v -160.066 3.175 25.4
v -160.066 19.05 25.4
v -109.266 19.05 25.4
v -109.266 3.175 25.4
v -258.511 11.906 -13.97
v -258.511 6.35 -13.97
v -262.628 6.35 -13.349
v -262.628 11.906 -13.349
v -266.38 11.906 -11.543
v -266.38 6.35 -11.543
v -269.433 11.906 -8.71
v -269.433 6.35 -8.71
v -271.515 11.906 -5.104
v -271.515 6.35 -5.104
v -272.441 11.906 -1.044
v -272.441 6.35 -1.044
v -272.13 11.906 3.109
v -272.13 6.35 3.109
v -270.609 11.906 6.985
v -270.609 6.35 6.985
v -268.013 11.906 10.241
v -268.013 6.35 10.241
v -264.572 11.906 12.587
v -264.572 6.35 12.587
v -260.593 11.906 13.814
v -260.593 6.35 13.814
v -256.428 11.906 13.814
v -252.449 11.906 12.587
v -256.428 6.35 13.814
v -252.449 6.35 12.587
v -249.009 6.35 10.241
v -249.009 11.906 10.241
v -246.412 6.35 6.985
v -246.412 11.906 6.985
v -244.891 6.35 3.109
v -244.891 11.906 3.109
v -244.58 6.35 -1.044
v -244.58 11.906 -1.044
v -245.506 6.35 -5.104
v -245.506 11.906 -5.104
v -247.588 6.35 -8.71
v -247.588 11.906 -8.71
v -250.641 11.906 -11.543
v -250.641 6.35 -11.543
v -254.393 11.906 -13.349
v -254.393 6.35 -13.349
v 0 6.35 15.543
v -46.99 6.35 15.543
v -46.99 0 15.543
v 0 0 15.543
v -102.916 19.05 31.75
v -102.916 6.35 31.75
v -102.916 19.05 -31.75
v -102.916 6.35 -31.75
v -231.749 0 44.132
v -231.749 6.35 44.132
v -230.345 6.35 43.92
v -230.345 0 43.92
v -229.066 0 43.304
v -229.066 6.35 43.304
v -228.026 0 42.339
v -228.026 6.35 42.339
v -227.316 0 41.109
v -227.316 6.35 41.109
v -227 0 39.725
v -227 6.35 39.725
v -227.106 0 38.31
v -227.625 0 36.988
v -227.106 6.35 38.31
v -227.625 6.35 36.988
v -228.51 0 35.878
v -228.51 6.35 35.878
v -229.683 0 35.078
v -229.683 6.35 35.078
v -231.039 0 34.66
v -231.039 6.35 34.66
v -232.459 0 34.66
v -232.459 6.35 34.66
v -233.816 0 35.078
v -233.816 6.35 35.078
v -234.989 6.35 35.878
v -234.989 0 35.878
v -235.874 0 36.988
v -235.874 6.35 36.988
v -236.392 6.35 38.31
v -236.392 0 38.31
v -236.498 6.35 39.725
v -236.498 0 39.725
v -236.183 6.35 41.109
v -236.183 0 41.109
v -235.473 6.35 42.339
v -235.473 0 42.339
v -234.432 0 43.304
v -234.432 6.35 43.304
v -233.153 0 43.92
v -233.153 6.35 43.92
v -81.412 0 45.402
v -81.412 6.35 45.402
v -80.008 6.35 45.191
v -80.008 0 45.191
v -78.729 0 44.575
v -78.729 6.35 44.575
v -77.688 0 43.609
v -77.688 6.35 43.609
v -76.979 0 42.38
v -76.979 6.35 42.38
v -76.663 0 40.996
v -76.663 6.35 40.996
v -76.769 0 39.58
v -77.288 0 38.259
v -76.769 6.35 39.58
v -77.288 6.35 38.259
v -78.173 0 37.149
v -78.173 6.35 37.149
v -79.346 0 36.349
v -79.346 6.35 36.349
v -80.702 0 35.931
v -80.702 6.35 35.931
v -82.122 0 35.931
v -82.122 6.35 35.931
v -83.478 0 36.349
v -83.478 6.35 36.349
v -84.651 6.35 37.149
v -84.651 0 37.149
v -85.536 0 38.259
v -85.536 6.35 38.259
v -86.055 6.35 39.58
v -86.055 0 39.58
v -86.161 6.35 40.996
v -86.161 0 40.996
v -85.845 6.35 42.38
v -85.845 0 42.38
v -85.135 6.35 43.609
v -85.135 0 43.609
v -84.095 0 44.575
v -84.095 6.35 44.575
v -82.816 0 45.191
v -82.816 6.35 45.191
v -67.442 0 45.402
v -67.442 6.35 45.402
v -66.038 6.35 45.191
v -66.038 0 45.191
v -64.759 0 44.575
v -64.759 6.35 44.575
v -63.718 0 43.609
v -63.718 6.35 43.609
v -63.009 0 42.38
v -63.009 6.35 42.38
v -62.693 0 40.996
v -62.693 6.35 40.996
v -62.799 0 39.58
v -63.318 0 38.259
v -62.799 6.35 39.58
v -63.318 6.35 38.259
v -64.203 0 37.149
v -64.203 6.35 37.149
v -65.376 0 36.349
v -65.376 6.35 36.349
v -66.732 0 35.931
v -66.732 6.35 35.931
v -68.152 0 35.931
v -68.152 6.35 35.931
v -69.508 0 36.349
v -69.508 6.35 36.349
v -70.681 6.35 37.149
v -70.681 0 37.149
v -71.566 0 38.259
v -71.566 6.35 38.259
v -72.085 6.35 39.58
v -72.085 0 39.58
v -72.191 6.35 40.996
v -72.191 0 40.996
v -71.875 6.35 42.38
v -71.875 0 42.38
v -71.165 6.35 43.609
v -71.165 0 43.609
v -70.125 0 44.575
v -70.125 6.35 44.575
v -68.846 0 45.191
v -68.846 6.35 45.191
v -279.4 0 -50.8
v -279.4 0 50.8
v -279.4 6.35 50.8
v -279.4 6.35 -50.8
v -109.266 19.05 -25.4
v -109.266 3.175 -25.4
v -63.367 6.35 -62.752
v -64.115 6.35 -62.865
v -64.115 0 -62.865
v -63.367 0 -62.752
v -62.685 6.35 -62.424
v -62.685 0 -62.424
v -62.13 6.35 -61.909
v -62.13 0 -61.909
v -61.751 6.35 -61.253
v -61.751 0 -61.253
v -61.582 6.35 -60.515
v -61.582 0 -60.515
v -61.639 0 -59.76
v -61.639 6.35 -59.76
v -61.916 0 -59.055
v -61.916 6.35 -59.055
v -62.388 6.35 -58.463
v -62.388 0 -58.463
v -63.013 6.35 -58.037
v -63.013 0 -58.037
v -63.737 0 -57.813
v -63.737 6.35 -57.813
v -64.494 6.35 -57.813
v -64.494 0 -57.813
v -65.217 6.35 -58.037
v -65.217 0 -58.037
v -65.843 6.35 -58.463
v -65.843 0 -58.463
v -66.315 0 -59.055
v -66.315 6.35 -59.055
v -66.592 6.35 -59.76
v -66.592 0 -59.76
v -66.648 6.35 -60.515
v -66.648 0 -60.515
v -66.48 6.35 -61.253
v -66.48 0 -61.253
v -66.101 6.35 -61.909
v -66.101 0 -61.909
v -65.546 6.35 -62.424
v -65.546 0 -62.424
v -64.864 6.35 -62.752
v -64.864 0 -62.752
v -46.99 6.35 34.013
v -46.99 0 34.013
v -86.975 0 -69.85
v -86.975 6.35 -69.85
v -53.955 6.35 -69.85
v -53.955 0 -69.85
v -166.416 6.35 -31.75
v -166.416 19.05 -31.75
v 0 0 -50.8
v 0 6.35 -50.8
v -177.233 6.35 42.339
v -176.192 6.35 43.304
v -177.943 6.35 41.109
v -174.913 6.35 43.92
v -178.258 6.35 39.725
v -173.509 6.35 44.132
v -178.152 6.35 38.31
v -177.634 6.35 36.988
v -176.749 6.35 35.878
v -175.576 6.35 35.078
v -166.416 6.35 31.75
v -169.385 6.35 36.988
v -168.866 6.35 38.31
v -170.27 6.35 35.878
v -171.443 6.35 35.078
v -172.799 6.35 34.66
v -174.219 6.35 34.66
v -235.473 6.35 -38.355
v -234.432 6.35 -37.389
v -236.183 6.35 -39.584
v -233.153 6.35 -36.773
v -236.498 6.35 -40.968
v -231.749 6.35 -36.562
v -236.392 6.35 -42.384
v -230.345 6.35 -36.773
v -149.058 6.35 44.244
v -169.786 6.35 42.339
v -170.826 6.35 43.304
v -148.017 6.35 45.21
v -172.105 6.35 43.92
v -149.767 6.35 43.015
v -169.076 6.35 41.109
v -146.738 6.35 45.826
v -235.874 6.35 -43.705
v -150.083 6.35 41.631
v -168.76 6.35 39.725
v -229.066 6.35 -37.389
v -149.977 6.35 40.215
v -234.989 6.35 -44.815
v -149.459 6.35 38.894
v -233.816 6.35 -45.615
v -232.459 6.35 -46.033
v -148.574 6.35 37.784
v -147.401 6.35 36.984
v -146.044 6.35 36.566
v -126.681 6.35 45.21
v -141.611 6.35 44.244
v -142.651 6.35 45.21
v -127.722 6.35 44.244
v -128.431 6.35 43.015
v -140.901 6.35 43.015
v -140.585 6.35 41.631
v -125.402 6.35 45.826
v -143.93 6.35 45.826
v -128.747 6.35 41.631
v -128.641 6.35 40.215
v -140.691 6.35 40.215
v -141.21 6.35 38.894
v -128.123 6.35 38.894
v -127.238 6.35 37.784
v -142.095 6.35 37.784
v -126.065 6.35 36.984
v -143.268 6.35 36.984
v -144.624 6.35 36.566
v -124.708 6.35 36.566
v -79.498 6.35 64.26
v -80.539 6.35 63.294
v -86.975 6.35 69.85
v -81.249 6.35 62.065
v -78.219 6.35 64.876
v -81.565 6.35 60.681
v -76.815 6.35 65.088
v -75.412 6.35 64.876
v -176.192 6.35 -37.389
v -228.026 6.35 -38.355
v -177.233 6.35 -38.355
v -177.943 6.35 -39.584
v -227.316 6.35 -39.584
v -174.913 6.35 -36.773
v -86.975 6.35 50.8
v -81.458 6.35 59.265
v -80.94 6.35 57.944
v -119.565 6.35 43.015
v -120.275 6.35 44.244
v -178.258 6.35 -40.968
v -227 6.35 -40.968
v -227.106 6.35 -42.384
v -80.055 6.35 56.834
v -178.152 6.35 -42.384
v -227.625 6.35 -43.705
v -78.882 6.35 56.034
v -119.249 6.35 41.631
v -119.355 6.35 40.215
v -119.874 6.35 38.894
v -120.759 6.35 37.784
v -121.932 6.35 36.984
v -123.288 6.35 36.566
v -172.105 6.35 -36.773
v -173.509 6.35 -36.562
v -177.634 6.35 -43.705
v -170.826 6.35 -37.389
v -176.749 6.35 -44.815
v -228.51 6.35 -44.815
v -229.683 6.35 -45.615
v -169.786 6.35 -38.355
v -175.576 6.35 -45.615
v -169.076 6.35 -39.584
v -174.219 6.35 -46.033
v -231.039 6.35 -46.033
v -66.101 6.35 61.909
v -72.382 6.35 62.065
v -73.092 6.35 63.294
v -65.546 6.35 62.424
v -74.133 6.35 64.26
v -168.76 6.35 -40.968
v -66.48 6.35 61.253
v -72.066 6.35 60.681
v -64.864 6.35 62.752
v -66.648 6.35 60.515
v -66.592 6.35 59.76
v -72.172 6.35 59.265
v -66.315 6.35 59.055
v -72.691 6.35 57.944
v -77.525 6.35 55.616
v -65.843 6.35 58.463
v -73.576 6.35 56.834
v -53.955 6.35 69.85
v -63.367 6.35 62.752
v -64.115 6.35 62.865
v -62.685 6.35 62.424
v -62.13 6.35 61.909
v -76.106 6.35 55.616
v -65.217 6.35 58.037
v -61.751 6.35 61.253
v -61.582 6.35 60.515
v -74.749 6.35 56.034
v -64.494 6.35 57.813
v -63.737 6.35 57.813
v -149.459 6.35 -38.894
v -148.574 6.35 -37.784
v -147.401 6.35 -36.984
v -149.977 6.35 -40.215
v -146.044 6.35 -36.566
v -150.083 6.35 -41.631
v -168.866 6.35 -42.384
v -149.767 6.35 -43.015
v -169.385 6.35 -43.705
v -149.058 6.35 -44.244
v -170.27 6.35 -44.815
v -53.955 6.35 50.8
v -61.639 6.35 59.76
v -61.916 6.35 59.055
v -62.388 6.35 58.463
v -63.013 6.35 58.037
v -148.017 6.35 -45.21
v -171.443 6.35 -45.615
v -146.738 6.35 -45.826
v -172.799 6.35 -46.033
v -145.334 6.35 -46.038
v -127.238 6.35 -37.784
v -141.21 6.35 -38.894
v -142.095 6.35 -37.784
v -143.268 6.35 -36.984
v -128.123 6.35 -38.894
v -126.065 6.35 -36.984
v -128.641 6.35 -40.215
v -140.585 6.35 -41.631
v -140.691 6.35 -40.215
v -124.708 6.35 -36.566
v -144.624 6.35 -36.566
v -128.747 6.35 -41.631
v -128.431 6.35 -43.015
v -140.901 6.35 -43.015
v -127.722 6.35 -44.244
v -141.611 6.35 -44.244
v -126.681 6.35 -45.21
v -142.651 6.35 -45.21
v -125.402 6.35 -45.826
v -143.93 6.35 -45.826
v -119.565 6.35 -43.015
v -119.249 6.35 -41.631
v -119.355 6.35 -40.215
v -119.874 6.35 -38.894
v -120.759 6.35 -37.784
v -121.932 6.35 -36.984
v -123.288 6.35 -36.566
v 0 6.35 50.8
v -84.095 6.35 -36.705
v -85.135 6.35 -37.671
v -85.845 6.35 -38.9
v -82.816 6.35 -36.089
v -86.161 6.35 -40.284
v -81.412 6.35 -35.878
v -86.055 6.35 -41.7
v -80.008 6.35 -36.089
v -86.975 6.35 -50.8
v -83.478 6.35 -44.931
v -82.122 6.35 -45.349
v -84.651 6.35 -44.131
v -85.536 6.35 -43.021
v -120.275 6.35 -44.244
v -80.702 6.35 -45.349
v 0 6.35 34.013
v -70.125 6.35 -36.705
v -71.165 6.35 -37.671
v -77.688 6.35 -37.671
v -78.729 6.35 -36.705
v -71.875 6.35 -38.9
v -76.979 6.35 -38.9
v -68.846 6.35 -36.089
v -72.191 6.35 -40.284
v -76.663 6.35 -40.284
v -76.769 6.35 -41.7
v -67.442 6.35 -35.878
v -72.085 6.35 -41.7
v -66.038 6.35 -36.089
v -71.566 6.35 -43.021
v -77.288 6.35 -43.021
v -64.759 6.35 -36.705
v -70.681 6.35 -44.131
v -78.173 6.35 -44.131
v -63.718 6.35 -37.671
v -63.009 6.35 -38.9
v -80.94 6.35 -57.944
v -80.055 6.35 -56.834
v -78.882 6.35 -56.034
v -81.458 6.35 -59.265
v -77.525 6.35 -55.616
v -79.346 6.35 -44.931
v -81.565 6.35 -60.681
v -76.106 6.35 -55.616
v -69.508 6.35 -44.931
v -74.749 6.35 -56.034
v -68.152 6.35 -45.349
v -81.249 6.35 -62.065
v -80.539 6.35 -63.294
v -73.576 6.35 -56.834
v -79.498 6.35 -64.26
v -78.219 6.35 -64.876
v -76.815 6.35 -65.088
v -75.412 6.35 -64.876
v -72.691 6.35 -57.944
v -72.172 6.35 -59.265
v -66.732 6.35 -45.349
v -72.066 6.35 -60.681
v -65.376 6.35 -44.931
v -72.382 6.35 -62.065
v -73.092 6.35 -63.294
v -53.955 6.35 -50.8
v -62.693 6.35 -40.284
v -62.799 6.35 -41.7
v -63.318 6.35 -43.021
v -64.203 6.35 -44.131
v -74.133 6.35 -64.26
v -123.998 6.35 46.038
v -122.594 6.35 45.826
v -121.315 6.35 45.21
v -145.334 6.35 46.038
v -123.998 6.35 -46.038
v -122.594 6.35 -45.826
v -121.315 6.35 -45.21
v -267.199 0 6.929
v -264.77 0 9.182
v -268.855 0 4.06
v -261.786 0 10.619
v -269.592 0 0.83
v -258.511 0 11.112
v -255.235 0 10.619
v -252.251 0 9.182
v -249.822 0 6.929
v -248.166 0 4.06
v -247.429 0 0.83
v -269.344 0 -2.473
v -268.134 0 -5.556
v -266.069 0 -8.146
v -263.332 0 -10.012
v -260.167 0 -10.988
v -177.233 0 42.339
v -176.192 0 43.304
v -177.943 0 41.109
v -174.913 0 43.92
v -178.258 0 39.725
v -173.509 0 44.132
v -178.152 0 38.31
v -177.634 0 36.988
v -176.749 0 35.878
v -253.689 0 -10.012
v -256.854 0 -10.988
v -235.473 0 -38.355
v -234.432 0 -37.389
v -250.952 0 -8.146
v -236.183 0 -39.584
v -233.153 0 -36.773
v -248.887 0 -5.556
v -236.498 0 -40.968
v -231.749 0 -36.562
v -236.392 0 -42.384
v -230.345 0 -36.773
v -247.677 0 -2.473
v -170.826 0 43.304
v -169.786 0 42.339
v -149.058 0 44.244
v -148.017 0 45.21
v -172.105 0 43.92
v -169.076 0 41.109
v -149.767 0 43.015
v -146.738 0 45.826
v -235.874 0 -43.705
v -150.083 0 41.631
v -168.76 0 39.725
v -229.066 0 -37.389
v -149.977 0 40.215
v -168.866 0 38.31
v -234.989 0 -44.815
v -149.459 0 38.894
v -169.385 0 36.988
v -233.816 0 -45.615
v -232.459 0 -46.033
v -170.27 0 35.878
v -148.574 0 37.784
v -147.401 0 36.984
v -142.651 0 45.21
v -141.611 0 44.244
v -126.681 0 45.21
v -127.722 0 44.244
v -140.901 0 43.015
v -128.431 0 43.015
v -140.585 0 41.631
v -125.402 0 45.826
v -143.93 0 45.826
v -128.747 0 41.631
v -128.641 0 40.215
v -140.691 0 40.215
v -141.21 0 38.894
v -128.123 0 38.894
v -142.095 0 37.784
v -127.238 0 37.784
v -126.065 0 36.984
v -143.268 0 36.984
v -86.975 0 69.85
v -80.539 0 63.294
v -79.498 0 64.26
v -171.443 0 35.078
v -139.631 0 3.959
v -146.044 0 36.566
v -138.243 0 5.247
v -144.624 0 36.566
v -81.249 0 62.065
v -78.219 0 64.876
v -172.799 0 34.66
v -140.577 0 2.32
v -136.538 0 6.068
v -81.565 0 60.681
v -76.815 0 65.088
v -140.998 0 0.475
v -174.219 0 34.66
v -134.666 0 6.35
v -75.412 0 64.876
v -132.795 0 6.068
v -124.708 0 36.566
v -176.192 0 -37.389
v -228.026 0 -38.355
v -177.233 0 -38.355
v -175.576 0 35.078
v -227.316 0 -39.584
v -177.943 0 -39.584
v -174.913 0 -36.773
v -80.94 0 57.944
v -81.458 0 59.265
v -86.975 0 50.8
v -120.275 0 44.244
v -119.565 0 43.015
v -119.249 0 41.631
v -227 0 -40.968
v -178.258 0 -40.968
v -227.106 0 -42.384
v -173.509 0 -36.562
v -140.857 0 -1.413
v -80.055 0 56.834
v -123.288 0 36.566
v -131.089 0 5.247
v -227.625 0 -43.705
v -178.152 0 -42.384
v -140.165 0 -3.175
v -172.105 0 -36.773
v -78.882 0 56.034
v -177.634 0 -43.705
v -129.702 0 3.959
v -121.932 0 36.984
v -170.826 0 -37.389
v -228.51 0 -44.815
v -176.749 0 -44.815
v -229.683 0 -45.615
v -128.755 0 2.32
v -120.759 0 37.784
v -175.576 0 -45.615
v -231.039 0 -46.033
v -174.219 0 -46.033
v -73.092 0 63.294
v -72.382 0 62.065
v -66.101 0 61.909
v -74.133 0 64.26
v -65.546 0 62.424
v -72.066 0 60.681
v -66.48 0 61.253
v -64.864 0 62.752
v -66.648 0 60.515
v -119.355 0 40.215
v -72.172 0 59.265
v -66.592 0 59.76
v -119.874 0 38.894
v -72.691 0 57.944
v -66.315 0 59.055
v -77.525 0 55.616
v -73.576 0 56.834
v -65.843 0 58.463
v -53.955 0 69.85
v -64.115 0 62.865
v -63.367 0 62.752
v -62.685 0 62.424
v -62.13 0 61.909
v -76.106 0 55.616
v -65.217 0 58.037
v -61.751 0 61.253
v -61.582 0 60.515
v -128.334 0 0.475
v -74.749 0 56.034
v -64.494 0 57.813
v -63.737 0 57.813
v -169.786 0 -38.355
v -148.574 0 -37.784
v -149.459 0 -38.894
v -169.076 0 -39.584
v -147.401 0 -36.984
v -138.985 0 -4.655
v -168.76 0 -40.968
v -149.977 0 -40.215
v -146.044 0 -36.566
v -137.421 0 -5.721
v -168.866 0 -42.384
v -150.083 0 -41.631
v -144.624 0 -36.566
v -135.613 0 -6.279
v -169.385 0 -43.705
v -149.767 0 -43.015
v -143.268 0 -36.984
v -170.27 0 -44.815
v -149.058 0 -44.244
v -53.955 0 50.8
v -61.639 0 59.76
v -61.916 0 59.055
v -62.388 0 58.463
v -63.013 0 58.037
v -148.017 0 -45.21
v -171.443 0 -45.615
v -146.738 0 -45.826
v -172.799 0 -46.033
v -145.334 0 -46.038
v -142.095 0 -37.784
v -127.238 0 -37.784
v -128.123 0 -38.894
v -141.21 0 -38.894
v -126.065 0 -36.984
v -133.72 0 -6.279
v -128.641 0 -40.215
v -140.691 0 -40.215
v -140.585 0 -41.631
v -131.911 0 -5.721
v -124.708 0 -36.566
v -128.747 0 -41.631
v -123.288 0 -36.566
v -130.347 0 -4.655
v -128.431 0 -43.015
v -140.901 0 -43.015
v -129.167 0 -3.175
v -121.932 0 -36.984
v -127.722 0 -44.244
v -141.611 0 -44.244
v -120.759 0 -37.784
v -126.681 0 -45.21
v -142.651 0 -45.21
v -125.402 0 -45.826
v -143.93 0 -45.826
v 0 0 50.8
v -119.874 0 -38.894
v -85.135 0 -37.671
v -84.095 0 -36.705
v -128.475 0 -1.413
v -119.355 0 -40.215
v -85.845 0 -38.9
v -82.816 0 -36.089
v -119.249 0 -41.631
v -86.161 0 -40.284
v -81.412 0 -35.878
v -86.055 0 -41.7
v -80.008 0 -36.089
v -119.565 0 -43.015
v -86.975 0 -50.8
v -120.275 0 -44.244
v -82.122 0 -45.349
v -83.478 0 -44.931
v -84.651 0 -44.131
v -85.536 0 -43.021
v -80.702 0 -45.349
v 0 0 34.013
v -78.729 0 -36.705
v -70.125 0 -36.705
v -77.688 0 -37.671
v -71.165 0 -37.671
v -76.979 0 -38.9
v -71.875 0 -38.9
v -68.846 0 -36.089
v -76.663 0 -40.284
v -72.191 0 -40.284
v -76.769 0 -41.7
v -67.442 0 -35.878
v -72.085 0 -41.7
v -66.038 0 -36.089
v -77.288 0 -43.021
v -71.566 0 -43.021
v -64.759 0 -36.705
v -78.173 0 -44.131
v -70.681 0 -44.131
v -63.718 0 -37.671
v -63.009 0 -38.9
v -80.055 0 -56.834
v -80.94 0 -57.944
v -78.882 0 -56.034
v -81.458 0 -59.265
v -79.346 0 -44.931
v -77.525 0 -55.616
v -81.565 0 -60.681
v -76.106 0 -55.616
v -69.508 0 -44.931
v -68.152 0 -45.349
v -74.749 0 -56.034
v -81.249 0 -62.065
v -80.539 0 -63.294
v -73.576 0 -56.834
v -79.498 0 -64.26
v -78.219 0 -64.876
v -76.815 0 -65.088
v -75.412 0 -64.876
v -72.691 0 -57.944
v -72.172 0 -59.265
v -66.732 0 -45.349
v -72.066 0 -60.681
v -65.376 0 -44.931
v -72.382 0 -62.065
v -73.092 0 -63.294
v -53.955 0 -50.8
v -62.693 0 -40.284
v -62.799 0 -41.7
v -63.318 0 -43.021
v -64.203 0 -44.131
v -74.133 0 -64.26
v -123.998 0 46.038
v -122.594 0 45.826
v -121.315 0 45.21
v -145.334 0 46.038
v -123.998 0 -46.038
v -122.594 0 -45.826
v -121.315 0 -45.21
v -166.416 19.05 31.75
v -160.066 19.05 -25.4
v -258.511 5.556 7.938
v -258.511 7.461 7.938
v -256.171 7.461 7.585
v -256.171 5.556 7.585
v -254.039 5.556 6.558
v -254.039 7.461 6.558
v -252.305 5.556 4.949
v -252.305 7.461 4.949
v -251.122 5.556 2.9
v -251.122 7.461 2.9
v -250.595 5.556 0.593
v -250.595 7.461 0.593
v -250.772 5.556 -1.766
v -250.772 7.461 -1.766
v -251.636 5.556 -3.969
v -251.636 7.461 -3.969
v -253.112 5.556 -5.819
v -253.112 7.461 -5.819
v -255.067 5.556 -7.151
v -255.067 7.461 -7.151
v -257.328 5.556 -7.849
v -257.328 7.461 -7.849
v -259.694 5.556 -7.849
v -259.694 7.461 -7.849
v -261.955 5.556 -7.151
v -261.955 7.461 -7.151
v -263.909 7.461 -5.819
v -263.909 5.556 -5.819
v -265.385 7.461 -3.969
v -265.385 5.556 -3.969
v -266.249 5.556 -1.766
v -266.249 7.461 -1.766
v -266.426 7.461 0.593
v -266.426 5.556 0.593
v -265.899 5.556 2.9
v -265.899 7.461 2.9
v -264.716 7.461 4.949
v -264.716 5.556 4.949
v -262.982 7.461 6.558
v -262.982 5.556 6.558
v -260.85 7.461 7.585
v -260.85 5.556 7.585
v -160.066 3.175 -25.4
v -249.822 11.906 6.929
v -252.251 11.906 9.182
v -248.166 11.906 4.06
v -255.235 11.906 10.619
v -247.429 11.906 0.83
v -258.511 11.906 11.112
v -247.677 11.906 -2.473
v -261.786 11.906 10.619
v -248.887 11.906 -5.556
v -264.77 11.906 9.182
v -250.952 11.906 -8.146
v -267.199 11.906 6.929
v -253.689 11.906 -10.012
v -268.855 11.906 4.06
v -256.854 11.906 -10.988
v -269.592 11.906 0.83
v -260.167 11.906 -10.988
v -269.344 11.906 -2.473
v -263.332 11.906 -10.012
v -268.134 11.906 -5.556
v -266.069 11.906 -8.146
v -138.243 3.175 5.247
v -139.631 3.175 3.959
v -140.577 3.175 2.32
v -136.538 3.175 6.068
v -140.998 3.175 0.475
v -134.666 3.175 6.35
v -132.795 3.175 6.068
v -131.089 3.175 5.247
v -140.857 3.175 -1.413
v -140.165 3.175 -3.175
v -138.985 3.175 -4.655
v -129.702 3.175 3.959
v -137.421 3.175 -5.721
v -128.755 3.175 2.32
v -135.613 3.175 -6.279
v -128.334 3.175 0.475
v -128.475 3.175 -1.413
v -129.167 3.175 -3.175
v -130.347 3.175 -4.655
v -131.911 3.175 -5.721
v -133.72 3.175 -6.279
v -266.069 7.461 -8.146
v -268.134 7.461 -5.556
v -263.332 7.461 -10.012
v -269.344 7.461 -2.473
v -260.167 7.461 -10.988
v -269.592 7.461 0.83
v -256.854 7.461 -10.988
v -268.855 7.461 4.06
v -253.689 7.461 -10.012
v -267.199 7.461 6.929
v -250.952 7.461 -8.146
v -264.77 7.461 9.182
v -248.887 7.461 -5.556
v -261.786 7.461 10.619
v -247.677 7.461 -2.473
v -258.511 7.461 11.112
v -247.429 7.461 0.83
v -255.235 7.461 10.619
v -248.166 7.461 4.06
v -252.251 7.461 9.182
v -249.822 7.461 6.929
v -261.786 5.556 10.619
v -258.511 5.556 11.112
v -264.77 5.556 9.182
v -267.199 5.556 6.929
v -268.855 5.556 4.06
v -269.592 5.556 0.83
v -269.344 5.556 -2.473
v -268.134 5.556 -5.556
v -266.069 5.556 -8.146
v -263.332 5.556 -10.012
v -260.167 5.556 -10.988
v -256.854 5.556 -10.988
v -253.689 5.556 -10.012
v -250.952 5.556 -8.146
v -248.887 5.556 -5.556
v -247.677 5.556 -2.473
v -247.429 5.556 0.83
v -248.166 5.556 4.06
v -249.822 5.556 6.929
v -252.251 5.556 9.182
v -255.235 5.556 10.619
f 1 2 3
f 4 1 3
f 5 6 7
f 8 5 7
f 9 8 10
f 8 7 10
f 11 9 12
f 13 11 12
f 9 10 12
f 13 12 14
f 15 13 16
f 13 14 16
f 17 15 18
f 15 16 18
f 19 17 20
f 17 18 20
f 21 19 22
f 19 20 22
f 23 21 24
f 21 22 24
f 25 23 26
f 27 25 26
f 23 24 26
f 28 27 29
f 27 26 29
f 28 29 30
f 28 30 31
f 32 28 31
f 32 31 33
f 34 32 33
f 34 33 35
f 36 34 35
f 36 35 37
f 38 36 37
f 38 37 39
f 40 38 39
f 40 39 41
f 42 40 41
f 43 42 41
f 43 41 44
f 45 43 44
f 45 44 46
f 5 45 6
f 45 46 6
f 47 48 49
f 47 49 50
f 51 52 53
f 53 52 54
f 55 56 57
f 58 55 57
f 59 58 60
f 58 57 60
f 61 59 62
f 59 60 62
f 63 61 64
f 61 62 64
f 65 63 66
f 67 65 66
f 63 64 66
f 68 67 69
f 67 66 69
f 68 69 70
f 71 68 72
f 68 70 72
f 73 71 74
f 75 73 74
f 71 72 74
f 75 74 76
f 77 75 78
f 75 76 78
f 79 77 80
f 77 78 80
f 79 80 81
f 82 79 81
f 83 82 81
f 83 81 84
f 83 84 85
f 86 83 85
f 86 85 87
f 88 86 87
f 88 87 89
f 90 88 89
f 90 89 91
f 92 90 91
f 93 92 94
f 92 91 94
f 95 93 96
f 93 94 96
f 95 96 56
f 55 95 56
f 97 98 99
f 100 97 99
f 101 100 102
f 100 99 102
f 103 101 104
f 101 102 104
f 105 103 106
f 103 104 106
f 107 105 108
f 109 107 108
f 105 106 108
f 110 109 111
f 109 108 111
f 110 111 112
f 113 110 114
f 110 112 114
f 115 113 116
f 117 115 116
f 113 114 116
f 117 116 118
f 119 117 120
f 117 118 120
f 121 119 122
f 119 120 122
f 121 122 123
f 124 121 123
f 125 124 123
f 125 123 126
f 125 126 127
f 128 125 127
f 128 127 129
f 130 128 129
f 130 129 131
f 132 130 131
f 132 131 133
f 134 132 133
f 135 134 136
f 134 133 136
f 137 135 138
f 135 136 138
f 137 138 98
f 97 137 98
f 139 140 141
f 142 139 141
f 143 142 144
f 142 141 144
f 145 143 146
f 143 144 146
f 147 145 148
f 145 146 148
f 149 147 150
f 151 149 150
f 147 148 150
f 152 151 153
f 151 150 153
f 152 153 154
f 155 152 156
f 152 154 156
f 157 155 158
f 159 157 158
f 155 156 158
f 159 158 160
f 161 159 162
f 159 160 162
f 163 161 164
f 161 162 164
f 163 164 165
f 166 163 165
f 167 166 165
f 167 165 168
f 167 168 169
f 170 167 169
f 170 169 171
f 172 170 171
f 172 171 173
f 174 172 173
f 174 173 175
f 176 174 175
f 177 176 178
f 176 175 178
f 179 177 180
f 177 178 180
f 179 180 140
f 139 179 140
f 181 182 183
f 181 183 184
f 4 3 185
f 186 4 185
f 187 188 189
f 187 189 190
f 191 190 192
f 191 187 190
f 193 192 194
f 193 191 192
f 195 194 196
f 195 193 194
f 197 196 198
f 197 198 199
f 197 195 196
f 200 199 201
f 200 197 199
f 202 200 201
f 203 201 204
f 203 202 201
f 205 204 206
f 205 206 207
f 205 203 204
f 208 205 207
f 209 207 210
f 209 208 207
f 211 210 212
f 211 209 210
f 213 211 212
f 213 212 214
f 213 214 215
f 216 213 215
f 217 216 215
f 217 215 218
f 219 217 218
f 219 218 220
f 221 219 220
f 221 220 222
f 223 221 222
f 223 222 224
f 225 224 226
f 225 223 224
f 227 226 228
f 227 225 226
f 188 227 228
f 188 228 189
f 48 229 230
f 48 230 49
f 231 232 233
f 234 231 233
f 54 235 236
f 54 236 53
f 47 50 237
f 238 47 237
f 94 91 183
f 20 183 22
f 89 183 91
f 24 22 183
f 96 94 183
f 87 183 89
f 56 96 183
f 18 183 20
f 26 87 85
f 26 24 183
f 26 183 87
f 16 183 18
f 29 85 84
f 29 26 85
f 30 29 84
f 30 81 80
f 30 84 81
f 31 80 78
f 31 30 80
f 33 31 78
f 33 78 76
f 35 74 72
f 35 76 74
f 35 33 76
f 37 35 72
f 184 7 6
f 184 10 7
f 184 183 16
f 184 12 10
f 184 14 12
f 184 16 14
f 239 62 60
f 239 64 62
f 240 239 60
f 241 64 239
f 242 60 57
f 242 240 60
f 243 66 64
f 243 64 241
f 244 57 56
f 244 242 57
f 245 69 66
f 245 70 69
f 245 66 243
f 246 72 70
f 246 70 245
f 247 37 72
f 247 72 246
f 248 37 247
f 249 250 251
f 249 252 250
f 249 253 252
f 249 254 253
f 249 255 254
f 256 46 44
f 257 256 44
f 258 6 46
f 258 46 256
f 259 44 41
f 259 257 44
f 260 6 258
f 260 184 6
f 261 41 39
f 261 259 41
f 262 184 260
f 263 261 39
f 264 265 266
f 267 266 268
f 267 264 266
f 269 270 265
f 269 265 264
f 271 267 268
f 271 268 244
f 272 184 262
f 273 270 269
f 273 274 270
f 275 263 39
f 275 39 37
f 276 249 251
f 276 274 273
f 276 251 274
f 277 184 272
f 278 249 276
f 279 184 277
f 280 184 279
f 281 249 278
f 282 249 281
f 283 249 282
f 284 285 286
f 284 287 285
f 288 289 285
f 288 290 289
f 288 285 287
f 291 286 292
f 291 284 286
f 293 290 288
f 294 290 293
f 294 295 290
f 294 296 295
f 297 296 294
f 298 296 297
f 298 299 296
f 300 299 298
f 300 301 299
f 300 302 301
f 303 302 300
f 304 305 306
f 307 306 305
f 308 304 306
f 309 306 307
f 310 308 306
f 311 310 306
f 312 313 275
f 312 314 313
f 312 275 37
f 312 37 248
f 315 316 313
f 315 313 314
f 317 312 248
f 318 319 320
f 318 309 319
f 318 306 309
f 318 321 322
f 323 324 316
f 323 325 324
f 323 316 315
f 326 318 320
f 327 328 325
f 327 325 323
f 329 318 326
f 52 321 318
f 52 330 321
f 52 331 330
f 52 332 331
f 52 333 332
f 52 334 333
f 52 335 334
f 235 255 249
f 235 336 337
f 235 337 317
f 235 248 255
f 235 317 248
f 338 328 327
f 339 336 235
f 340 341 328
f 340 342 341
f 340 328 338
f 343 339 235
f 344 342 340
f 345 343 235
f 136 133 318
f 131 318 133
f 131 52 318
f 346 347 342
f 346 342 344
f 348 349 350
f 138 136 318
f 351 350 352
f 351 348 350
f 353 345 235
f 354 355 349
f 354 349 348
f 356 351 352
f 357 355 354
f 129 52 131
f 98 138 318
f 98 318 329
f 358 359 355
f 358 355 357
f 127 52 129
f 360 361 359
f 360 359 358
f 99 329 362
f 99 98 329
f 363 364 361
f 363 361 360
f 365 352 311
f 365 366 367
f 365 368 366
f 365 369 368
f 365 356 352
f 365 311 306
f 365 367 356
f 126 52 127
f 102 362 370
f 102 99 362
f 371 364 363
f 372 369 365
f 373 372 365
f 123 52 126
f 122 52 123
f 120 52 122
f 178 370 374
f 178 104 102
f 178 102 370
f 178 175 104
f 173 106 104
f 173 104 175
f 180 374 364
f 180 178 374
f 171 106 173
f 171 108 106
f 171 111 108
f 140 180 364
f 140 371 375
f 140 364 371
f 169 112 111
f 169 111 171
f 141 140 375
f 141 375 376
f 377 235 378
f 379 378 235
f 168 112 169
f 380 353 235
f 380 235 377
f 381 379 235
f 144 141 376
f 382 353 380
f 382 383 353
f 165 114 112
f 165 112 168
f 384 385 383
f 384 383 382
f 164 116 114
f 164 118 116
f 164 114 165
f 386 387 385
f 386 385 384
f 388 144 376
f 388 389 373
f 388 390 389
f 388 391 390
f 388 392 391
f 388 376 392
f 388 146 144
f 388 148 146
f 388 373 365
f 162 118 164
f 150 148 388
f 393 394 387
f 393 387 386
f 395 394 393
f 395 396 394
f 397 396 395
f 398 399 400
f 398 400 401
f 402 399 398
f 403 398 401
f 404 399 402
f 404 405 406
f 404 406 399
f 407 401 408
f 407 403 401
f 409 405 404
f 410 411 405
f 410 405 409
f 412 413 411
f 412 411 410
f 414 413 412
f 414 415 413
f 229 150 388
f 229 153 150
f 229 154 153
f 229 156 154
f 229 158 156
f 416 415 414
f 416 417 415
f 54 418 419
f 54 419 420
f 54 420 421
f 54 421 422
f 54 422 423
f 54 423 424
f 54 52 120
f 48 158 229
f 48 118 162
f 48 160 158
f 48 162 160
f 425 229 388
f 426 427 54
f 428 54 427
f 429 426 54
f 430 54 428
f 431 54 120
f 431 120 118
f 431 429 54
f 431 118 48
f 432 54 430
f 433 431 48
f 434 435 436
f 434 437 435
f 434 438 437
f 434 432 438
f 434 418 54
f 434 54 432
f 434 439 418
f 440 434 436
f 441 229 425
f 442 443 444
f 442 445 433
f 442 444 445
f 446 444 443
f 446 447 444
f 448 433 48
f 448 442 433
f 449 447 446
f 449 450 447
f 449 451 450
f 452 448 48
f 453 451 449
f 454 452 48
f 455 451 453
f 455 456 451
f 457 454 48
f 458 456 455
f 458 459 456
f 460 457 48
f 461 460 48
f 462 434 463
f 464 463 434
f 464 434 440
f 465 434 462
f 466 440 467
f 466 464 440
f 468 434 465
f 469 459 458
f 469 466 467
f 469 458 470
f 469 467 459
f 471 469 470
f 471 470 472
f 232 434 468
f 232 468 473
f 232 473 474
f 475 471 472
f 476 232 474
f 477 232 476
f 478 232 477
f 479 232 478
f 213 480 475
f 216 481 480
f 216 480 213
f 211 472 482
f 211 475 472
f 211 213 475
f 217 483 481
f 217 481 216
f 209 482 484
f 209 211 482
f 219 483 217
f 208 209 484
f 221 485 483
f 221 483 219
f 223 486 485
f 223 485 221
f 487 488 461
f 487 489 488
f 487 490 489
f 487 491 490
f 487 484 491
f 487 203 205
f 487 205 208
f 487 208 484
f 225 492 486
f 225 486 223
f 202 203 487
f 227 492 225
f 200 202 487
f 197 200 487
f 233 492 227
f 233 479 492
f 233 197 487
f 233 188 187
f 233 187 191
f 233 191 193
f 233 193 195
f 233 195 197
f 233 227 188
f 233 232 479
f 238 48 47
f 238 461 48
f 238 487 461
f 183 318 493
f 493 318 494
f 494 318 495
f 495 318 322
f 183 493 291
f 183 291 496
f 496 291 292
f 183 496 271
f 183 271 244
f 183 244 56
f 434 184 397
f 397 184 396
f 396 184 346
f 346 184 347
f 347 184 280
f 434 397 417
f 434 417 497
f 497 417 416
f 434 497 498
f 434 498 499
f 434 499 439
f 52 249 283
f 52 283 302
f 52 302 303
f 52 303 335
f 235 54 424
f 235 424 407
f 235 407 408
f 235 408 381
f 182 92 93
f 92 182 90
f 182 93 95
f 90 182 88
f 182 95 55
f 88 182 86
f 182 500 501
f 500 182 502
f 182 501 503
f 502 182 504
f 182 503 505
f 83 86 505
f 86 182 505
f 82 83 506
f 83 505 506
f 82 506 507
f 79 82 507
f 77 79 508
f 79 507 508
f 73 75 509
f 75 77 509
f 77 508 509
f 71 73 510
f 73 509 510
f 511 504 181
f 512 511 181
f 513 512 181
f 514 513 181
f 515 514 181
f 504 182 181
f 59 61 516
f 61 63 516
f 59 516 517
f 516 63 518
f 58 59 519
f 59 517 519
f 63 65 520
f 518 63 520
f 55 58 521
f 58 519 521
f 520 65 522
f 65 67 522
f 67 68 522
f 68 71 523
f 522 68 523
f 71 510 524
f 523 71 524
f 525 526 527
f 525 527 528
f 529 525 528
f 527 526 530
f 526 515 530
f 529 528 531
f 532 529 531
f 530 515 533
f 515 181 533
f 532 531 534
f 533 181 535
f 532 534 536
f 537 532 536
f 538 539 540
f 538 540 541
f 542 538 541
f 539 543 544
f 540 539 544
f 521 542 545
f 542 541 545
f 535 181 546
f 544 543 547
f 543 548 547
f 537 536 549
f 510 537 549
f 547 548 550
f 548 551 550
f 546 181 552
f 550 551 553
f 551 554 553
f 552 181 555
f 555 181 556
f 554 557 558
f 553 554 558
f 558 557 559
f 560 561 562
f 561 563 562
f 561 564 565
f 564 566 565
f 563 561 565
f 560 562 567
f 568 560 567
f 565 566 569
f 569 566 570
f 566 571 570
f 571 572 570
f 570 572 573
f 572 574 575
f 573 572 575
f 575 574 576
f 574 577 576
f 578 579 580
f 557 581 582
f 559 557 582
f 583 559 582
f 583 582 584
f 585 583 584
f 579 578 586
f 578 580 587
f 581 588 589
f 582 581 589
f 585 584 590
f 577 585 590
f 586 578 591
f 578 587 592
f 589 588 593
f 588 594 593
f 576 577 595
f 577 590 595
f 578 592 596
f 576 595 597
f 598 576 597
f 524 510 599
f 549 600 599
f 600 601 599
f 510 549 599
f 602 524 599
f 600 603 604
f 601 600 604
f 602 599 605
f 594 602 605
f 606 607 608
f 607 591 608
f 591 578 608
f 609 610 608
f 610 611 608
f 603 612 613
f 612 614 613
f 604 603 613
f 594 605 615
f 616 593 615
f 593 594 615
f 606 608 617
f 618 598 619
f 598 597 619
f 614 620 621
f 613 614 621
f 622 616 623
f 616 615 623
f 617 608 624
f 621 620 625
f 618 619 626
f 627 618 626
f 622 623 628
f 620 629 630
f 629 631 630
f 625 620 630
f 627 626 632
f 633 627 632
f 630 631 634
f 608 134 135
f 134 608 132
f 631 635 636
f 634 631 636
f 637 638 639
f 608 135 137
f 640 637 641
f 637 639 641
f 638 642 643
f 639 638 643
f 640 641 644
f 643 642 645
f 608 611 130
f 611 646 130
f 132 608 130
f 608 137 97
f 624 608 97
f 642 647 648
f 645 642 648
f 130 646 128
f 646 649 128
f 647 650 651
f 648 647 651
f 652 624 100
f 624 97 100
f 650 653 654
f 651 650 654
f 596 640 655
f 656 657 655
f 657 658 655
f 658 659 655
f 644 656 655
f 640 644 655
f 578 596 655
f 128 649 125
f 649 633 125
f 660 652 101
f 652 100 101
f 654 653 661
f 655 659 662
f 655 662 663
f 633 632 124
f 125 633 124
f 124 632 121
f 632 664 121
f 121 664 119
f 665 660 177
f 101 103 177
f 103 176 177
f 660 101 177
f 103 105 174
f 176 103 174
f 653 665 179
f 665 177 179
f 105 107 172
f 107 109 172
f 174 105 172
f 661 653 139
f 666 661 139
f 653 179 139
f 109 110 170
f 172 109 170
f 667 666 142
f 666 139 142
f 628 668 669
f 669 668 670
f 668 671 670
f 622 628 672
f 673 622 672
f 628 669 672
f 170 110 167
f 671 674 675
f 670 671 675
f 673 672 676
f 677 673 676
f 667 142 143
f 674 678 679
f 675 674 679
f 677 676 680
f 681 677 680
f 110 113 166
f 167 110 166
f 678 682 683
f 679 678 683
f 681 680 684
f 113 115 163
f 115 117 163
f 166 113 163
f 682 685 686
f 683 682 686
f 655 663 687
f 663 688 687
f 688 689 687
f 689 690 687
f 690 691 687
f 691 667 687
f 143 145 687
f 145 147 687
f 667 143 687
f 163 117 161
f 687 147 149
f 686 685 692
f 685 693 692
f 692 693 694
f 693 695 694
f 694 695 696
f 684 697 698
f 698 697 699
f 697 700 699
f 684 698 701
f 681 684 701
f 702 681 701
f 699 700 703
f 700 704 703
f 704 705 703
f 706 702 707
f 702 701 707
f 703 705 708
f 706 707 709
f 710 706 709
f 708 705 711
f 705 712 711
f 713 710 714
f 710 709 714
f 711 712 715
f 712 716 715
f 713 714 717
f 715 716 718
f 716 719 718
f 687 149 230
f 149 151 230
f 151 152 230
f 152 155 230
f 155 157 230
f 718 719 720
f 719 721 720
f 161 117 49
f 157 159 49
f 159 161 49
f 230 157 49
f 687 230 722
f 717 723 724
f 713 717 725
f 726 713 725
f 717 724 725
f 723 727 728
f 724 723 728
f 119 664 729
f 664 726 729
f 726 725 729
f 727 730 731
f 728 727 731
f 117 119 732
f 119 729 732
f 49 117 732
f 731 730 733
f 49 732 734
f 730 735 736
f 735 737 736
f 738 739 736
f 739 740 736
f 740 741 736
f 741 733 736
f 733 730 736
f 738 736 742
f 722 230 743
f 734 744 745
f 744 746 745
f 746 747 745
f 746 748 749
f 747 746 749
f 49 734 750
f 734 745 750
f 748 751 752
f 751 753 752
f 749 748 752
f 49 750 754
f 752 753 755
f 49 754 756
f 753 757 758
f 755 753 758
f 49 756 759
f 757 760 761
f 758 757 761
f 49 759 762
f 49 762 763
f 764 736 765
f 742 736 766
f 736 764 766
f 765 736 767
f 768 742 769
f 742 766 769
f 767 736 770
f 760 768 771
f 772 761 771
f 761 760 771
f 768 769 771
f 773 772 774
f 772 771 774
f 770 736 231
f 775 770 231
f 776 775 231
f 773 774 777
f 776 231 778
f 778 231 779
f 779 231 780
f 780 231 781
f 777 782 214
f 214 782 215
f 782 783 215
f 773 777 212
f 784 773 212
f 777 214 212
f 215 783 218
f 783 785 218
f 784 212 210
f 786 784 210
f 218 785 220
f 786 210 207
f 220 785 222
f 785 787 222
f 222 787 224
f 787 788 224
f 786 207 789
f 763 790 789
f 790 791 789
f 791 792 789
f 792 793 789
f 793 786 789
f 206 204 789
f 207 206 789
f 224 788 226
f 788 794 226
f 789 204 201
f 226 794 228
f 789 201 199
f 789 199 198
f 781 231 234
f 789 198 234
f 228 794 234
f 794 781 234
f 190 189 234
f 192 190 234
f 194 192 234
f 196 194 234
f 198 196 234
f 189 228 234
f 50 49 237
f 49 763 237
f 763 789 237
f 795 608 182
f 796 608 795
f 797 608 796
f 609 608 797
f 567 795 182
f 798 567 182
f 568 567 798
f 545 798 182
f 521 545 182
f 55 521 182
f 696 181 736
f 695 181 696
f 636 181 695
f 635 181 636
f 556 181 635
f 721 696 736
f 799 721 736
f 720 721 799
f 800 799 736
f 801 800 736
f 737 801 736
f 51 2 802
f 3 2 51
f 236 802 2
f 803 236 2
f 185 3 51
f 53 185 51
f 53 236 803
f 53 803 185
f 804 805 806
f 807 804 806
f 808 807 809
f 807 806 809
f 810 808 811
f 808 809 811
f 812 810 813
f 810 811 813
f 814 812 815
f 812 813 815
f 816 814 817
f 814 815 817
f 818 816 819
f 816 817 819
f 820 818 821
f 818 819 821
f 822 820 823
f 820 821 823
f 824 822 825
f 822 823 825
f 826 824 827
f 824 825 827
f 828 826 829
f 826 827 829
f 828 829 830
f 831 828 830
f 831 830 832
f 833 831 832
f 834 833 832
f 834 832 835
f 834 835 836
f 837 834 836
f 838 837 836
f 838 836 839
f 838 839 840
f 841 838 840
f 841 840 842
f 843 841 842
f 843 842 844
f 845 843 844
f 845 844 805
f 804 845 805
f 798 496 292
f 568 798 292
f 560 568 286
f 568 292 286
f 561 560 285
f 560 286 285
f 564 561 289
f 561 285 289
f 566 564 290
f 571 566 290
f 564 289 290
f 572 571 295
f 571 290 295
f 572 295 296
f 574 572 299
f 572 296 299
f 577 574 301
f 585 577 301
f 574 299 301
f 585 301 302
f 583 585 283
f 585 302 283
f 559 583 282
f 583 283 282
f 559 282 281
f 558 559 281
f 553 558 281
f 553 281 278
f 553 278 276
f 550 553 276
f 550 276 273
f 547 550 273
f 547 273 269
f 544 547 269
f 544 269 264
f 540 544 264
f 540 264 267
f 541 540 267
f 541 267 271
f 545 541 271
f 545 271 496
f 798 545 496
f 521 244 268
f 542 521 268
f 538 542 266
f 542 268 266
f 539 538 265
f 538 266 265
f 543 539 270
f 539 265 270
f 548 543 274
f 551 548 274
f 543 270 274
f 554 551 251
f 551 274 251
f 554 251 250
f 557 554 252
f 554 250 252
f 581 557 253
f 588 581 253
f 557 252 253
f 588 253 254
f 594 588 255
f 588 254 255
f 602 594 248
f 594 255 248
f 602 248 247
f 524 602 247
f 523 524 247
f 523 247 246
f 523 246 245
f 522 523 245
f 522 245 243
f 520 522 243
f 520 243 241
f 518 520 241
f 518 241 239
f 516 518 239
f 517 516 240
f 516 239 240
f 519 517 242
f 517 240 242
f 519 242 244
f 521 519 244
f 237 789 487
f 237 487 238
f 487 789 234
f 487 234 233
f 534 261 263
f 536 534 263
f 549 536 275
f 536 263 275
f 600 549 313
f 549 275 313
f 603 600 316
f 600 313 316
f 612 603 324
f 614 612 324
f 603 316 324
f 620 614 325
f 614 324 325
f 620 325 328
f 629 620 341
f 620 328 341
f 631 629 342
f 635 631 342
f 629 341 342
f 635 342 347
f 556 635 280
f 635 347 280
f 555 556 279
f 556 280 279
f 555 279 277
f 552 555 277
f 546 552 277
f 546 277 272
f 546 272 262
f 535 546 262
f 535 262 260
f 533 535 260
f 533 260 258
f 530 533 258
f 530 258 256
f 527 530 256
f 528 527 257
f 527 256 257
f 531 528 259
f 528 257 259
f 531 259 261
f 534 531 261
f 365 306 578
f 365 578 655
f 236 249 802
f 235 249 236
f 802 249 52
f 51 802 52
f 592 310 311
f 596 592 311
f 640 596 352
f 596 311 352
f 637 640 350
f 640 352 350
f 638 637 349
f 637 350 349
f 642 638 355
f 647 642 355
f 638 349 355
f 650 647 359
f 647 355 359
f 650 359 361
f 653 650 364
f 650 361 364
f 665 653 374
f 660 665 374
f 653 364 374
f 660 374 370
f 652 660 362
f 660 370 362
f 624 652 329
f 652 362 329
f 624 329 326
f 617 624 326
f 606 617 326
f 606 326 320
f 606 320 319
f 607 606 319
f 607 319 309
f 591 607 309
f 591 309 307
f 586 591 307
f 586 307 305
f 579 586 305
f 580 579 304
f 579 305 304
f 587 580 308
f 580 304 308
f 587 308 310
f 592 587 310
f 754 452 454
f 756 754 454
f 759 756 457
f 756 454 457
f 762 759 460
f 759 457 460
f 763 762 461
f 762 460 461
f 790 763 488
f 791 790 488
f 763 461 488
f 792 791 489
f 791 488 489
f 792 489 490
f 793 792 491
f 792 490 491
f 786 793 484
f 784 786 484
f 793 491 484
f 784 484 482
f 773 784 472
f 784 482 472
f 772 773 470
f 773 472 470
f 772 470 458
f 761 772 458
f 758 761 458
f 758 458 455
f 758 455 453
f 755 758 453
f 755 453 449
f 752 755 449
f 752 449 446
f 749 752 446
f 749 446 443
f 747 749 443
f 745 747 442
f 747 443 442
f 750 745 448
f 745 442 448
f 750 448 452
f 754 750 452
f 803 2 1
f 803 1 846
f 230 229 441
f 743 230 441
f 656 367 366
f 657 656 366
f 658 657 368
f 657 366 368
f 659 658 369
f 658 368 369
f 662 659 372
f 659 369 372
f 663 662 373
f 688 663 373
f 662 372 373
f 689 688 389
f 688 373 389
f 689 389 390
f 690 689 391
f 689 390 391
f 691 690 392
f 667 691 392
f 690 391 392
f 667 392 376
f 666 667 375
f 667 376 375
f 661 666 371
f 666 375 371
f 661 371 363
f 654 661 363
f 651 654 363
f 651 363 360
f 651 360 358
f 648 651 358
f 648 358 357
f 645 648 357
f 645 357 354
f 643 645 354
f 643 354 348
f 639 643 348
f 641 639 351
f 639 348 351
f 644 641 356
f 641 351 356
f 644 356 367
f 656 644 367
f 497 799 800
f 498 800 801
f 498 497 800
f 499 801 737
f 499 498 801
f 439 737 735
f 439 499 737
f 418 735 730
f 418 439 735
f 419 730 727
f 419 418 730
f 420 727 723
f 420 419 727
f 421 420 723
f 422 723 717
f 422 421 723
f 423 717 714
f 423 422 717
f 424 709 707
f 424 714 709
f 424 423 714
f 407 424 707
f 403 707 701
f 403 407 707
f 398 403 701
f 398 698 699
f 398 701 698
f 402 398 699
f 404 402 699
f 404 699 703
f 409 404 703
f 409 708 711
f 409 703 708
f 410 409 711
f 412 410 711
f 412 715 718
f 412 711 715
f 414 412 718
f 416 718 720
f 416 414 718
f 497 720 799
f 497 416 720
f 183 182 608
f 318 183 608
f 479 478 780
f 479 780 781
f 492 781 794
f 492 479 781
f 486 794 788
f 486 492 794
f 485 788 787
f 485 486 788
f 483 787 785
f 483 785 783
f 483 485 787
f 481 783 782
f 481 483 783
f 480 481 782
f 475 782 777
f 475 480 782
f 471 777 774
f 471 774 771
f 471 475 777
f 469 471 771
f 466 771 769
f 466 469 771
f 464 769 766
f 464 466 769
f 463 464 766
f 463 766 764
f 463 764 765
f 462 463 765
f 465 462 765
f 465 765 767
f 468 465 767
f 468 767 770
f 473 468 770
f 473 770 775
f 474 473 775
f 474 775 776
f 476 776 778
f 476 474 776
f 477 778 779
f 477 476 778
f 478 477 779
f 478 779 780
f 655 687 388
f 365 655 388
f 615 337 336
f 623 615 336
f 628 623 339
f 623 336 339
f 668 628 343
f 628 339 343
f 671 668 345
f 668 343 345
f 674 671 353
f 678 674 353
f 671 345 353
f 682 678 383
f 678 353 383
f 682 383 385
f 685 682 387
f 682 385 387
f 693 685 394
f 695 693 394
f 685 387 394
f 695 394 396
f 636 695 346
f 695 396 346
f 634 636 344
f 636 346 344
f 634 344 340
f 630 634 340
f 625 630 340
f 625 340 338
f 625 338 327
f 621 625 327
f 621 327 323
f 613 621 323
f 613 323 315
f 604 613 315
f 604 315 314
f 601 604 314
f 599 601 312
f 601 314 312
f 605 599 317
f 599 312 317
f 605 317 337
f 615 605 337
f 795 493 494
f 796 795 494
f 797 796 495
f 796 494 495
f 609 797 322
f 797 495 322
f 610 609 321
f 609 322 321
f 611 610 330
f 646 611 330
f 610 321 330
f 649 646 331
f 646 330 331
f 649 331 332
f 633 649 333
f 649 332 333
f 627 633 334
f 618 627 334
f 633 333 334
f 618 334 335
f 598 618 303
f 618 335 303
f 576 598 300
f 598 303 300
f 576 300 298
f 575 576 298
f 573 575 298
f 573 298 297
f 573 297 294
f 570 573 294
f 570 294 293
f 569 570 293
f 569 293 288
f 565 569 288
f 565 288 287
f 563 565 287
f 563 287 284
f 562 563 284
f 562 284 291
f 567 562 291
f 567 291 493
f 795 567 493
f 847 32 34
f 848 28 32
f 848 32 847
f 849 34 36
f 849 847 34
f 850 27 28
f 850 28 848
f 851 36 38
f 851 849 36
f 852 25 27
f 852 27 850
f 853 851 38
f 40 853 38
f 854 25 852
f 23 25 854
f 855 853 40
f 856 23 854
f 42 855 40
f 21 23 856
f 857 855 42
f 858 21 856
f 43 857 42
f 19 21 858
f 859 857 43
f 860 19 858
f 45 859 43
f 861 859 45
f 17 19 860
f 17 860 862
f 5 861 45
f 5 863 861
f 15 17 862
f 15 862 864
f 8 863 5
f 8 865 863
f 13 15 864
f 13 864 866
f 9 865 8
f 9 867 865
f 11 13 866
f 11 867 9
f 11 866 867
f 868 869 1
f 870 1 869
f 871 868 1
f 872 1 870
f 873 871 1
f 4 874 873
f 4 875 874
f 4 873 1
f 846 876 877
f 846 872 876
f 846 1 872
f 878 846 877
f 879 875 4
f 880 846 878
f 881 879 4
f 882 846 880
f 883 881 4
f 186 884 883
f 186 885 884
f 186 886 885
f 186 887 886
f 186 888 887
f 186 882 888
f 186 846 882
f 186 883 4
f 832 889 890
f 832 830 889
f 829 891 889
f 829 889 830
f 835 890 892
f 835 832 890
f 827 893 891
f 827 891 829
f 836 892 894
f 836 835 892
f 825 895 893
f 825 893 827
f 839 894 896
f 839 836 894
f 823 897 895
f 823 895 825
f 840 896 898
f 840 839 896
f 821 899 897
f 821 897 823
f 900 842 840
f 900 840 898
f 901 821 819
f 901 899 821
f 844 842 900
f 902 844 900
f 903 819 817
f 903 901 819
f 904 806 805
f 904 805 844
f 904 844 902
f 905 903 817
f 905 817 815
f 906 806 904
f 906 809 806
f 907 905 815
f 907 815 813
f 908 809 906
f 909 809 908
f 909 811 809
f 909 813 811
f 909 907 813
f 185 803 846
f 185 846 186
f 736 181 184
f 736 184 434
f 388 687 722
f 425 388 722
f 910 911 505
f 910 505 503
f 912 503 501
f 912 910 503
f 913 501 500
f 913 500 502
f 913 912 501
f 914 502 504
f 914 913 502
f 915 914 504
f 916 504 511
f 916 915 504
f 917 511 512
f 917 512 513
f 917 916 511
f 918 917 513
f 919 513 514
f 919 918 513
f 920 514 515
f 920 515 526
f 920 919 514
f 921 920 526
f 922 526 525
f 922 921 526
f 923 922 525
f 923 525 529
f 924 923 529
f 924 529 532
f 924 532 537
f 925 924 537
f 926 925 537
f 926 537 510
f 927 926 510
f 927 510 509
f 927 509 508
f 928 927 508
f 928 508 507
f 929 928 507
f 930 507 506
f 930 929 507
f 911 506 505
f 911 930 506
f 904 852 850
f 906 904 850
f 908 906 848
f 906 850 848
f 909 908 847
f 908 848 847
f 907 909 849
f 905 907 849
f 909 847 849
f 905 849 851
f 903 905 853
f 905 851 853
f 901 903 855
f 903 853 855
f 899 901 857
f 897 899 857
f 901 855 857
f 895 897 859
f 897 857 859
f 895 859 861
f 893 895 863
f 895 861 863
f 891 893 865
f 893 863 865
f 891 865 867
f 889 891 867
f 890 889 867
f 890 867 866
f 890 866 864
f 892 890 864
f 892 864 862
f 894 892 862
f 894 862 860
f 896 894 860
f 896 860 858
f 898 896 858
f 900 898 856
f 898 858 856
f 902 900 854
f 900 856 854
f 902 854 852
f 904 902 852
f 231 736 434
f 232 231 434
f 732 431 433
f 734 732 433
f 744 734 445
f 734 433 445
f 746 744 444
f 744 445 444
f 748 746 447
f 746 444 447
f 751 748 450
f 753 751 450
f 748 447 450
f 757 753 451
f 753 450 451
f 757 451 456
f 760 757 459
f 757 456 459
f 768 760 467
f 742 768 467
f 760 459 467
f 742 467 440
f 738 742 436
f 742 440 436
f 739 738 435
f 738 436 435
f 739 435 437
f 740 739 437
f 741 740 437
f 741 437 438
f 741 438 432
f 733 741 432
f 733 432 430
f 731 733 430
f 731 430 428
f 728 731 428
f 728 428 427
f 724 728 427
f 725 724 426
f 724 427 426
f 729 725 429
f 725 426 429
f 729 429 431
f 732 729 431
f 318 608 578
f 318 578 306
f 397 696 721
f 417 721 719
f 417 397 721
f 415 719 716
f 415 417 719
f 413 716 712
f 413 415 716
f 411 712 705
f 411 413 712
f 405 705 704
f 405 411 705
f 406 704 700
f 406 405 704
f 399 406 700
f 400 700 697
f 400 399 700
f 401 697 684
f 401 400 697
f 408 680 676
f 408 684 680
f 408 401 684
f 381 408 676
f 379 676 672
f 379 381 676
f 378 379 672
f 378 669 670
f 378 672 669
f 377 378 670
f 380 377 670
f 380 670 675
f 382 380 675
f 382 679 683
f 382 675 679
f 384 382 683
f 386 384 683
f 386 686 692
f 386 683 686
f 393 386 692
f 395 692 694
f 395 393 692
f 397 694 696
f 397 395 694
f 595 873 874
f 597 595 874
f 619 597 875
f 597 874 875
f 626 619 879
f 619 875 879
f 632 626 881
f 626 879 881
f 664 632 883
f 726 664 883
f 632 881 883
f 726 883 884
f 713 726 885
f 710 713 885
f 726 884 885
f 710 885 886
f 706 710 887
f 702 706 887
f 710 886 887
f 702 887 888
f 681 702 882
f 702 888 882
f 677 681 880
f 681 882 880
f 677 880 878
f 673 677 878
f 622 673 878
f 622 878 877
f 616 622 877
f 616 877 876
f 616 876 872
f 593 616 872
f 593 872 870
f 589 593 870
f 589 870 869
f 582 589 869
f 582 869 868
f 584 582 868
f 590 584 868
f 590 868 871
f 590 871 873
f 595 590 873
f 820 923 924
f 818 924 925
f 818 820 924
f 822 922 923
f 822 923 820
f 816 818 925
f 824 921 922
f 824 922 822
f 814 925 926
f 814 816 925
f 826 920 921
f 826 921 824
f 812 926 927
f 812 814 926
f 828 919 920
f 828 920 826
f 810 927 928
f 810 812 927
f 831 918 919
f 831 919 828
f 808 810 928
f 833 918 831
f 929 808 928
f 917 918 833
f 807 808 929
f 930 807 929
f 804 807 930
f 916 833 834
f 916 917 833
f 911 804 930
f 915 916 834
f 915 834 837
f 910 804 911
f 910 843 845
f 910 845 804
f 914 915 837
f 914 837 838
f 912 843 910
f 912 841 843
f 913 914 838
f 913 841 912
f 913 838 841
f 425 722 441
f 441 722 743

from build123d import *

# Parameters (mm, degrees)
SKETCH1_W            = 279.4
SKETCH1_H            = 101.6
BOSS_EXTRUDE1_DEPTH  = 6.35
SKETCH2_R            = 13.97
BOSS_EXTRUDE3_DEPTH  = 5.55625
SKETCH9_R            = 11.1125
CUT_EXTRUDE4_DEPTH   = 4.445
CUT_EXTRUDE5_START   = -5.55625
SKETCH10_R           = 11.1125
CUT_EXTRUDE5_DEPTH   = 5.55625
SKETCH11_R           = 7.9375
CUT_EXTRUDE6_DEPTH   = 285.078633923
SKETCH12_R           = 6.35
CUT_EXTRUDE7_DEPTH   = 285.051619429
SKETCH22_W           = 63.5
SKETCH22_H           = 63.5
BOSS_EXTRUDE7_DEPTH  = 12.7
SKETCH25_W           = 50.8
SKETCH25_H           = 50.8
CUT_EXTRUDE11_DEPTH  = 15.875
SKETCH32_R           = 4.7625
CUT_EXTRUDE12_DEPTH  = 6.35
SKETCH38_W           = 46.99
SKETCH38_H           = 18.470251096
CUT_EXTRUDE13_DEPTH  = 6.35
SKETCH60_R           = 4.7625
CUT_EXTRUDE23_DEPTH  = 6.35
SKETCH64_R           = 4.7625
CUT_EXTRUDE24_DEPTH  = 285.264471927
SKETCH69_W           = 33.02
SKETCH69_H           = 6.35
BOSS_EXTRUDE10_DEPTH = 19.05
SKETCH70_R           = 4.7625
SKETCH70_R_2         = 2.54
CUT_EXTRUDE26_DEPTH  = 6.35


with BuildPart() as part:
    # Sketch1 → Boss-Extrude1 (new body)
    with BuildSketch(Plane(origin=(0, 0, 0), x_dir=(1, 0, 0), z_dir=(0, 1, 0))):
        with Locations((-139.7, 0)):
            Rectangle(SKETCH1_W, SKETCH1_H)
    extrude(amount=BOSS_EXTRUDE1_DEPTH)

    # Sketch2 → Boss-Extrude3 (add)
    with BuildSketch(Plane(origin=(0, 6.35, 0), x_dir=(1, 0, 0), z_dir=(0, 1, 0))):
        with Locations(Location((-258.510557857, 0, 0), (0, 0, 90))):
            Circle(SKETCH2_R)
    extrude(amount=BOSS_EXTRUDE3_DEPTH)

    # Sketch9 → Cut-Extrude4 (cut)
    with BuildSketch(Plane(origin=(0, 11.90625, 0), x_dir=(1, 0, 0), z_dir=(0, 1, 0))):
        with Locations(Location((-258.510557857, 0, 0), (0, 0, 270))):
            Circle(SKETCH9_R)
    extrude(amount=-CUT_EXTRUDE4_DEPTH, mode=Mode.SUBTRACT)

    # Sketch10 → Cut-Extrude5 (cut)
    with BuildSketch(Plane(origin=(0, 0, 0), x_dir=(-1, 0, 0), z_dir=(0, -1, 0)).offset(CUT_EXTRUDE5_START)):
        with Locations(Location((258.510557857, 0, 0), (0, 0, 270))):
            Circle(SKETCH10_R)
    extrude(amount=CUT_EXTRUDE5_DEPTH, mode=Mode.SUBTRACT)

    # Sketch11 → Cut-Extrude6 (cut, through all)
    with BuildSketch(Plane(origin=(0, 7.46125, 0), x_dir=(1, 0, 0), z_dir=(0, 1, 0))):
        with Locations(Location((-258.510557857, 0, 0), (0, 0, 270))):
            Circle(SKETCH11_R)
    extrude(amount=-CUT_EXTRUDE6_DEPTH, mode=Mode.SUBTRACT)

    # Sketch12 → Cut-Extrude7 (cut, through all)
    with BuildSketch(Plane(origin=(0, 6.35, 0), x_dir=(1, 0, 0), z_dir=(0, 1, 0))):
        with Locations(Location((-134.666203771, 0, 0), (0, 0, 270))):
            Circle(SKETCH12_R)
    extrude(amount=-CUT_EXTRUDE7_DEPTH, mode=Mode.SUBTRACT)

    # Sketch22 → Boss-Extrude7 (add)
    with BuildSketch(Plane(origin=(0, 6.35, 0), x_dir=(1, 0, 0), z_dir=(0, 1, 0))):
        with Locations((-134.666203771, 0)):
            Rectangle(SKETCH22_W, SKETCH22_H)
    extrude(amount=BOSS_EXTRUDE7_DEPTH)

    # Sketch25 → Cut-Extrude11 (cut)
    with BuildSketch(Plane(origin=(0, 19.05, 0), x_dir=(1, 0, 0), z_dir=(0, 1, 0))):
        with Locations((-134.666203771, 0)):
            Rectangle(SKETCH25_W, SKETCH25_H)
    extrude(amount=-CUT_EXTRUDE11_DEPTH, mode=Mode.SUBTRACT)

    # Sketch32 → Cut-Extrude12 (cut)
    with BuildSketch(Plane(origin=(0, 6.35, 0), x_dir=(1, 0, 0), z_dir=(0, 1, 0))):
        with Locations(Location((-67.44195898, -40.64, 0), (0, 0, 270))):
            Circle(SKETCH32_R)
        with Locations(Location((-81.41195898, -40.64, 0), (0, 0, 270))):
            Circle(SKETCH32_R)
        with Locations(Location((-67.44195898, 40.64, 0), (0, 0, 270))):
            Circle(SKETCH32_R)
        with Locations(Location((-81.41195898, 40.64, 0), (0, 0, 270))):
            Circle(SKETCH32_R)
    extrude(amount=-CUT_EXTRUDE12_DEPTH, mode=Mode.SUBTRACT)

    # Sketch38 → Cut-Extrude13 (cut)
    with BuildSketch(Plane(origin=(0, 6.35, 0), x_dir=(1, 0, 0), z_dir=(0, 1, 0))):
        with Locations((-23.495, -24.777709652)):
            Rectangle(SKETCH38_W, SKETCH38_H)
    extrude(amount=-CUT_EXTRUDE13_DEPTH, mode=Mode.SUBTRACT)

    # Sketch60 → Cut-Extrude23 (cut)
    with BuildSketch(Plane(origin=(0, 6.35, 0), x_dir=(1, 0, 0), z_dir=(0, 1, 0))):
        with Locations(Location((-231.7492444, 41.324145444, 0), (0, 0, 270))):
            Circle(SKETCH60_R)
        with Locations(Location((-231.7492444, -39.369341378, 0), (0, 0, 270))):
            Circle(SKETCH60_R)
        with Locations(Location((-173.509244294, -39.369341378, 0), (0, 0, 270))):
            Circle(SKETCH60_R)
        with Locations(Location((-173.509244294, 41.324145444, 0), (0, 0, 270))):
            Circle(SKETCH60_R)
    extrude(amount=-CUT_EXTRUDE23_DEPTH, mode=Mode.SUBTRACT)

    # Sketch64 → Cut-Extrude24 (cut, through all)
    with BuildSketch(Plane(origin=(0, 6.35, 0), x_dir=(1, 0, 0), z_dir=(0, 1, 0))):
        with Locations(Location((-145.334203771, -41.275, 0), (0, 0, 270))):
            Circle(SKETCH64_R)
        with Locations(Location((-123.998203771, -41.275, 0), (0, 0, 270))):
            Circle(SKETCH64_R)
    cut_extrude24 = extrude(amount=-CUT_EXTRUDE24_DEPTH, mode=Mode.SUBTRACT)

    # Mirror1: Cut-Extrude24 across plane
    add(cut_extrude24.mirror(Plane.XY), mode=Mode.SUBTRACT)

    # Sketch69 → Boss-Extrude10 (add)
    with BuildSketch(Plane.XY.offset(50.8)):
        with Locations((-70.465355554, 3.175)):
            Rectangle(SKETCH69_W, SKETCH69_H)
    boss_extrude10 = extrude(amount=BOSS_EXTRUDE10_DEPTH)

    # Sketch70 → Cut-Extrude26 (cut)
    with BuildSketch(Plane(origin=(0, 6.35, 0), x_dir=(1, 0, 0), z_dir=(0, 1, 0))):
        with Locations(Location((-76.815355554, -60.325, 0), (0, 0, 270))):
            Circle(SKETCH70_R)
        with Locations(Location((-64.115355554, -60.325, 0), (0, 0, 270))):
            Circle(SKETCH70_R_2)
    cut_extrude26 = extrude(amount=-CUT_EXTRUDE26_DEPTH, mode=Mode.SUBTRACT)

    # Mirror2: Boss-Extrude10, Cut-Extrude26 across plane
    add(boss_extrude10.mirror(Plane.XY))
    add(cut_extrude26.mirror(Plane.XY), mode=Mode.SUBTRACT)


solid = part.part
